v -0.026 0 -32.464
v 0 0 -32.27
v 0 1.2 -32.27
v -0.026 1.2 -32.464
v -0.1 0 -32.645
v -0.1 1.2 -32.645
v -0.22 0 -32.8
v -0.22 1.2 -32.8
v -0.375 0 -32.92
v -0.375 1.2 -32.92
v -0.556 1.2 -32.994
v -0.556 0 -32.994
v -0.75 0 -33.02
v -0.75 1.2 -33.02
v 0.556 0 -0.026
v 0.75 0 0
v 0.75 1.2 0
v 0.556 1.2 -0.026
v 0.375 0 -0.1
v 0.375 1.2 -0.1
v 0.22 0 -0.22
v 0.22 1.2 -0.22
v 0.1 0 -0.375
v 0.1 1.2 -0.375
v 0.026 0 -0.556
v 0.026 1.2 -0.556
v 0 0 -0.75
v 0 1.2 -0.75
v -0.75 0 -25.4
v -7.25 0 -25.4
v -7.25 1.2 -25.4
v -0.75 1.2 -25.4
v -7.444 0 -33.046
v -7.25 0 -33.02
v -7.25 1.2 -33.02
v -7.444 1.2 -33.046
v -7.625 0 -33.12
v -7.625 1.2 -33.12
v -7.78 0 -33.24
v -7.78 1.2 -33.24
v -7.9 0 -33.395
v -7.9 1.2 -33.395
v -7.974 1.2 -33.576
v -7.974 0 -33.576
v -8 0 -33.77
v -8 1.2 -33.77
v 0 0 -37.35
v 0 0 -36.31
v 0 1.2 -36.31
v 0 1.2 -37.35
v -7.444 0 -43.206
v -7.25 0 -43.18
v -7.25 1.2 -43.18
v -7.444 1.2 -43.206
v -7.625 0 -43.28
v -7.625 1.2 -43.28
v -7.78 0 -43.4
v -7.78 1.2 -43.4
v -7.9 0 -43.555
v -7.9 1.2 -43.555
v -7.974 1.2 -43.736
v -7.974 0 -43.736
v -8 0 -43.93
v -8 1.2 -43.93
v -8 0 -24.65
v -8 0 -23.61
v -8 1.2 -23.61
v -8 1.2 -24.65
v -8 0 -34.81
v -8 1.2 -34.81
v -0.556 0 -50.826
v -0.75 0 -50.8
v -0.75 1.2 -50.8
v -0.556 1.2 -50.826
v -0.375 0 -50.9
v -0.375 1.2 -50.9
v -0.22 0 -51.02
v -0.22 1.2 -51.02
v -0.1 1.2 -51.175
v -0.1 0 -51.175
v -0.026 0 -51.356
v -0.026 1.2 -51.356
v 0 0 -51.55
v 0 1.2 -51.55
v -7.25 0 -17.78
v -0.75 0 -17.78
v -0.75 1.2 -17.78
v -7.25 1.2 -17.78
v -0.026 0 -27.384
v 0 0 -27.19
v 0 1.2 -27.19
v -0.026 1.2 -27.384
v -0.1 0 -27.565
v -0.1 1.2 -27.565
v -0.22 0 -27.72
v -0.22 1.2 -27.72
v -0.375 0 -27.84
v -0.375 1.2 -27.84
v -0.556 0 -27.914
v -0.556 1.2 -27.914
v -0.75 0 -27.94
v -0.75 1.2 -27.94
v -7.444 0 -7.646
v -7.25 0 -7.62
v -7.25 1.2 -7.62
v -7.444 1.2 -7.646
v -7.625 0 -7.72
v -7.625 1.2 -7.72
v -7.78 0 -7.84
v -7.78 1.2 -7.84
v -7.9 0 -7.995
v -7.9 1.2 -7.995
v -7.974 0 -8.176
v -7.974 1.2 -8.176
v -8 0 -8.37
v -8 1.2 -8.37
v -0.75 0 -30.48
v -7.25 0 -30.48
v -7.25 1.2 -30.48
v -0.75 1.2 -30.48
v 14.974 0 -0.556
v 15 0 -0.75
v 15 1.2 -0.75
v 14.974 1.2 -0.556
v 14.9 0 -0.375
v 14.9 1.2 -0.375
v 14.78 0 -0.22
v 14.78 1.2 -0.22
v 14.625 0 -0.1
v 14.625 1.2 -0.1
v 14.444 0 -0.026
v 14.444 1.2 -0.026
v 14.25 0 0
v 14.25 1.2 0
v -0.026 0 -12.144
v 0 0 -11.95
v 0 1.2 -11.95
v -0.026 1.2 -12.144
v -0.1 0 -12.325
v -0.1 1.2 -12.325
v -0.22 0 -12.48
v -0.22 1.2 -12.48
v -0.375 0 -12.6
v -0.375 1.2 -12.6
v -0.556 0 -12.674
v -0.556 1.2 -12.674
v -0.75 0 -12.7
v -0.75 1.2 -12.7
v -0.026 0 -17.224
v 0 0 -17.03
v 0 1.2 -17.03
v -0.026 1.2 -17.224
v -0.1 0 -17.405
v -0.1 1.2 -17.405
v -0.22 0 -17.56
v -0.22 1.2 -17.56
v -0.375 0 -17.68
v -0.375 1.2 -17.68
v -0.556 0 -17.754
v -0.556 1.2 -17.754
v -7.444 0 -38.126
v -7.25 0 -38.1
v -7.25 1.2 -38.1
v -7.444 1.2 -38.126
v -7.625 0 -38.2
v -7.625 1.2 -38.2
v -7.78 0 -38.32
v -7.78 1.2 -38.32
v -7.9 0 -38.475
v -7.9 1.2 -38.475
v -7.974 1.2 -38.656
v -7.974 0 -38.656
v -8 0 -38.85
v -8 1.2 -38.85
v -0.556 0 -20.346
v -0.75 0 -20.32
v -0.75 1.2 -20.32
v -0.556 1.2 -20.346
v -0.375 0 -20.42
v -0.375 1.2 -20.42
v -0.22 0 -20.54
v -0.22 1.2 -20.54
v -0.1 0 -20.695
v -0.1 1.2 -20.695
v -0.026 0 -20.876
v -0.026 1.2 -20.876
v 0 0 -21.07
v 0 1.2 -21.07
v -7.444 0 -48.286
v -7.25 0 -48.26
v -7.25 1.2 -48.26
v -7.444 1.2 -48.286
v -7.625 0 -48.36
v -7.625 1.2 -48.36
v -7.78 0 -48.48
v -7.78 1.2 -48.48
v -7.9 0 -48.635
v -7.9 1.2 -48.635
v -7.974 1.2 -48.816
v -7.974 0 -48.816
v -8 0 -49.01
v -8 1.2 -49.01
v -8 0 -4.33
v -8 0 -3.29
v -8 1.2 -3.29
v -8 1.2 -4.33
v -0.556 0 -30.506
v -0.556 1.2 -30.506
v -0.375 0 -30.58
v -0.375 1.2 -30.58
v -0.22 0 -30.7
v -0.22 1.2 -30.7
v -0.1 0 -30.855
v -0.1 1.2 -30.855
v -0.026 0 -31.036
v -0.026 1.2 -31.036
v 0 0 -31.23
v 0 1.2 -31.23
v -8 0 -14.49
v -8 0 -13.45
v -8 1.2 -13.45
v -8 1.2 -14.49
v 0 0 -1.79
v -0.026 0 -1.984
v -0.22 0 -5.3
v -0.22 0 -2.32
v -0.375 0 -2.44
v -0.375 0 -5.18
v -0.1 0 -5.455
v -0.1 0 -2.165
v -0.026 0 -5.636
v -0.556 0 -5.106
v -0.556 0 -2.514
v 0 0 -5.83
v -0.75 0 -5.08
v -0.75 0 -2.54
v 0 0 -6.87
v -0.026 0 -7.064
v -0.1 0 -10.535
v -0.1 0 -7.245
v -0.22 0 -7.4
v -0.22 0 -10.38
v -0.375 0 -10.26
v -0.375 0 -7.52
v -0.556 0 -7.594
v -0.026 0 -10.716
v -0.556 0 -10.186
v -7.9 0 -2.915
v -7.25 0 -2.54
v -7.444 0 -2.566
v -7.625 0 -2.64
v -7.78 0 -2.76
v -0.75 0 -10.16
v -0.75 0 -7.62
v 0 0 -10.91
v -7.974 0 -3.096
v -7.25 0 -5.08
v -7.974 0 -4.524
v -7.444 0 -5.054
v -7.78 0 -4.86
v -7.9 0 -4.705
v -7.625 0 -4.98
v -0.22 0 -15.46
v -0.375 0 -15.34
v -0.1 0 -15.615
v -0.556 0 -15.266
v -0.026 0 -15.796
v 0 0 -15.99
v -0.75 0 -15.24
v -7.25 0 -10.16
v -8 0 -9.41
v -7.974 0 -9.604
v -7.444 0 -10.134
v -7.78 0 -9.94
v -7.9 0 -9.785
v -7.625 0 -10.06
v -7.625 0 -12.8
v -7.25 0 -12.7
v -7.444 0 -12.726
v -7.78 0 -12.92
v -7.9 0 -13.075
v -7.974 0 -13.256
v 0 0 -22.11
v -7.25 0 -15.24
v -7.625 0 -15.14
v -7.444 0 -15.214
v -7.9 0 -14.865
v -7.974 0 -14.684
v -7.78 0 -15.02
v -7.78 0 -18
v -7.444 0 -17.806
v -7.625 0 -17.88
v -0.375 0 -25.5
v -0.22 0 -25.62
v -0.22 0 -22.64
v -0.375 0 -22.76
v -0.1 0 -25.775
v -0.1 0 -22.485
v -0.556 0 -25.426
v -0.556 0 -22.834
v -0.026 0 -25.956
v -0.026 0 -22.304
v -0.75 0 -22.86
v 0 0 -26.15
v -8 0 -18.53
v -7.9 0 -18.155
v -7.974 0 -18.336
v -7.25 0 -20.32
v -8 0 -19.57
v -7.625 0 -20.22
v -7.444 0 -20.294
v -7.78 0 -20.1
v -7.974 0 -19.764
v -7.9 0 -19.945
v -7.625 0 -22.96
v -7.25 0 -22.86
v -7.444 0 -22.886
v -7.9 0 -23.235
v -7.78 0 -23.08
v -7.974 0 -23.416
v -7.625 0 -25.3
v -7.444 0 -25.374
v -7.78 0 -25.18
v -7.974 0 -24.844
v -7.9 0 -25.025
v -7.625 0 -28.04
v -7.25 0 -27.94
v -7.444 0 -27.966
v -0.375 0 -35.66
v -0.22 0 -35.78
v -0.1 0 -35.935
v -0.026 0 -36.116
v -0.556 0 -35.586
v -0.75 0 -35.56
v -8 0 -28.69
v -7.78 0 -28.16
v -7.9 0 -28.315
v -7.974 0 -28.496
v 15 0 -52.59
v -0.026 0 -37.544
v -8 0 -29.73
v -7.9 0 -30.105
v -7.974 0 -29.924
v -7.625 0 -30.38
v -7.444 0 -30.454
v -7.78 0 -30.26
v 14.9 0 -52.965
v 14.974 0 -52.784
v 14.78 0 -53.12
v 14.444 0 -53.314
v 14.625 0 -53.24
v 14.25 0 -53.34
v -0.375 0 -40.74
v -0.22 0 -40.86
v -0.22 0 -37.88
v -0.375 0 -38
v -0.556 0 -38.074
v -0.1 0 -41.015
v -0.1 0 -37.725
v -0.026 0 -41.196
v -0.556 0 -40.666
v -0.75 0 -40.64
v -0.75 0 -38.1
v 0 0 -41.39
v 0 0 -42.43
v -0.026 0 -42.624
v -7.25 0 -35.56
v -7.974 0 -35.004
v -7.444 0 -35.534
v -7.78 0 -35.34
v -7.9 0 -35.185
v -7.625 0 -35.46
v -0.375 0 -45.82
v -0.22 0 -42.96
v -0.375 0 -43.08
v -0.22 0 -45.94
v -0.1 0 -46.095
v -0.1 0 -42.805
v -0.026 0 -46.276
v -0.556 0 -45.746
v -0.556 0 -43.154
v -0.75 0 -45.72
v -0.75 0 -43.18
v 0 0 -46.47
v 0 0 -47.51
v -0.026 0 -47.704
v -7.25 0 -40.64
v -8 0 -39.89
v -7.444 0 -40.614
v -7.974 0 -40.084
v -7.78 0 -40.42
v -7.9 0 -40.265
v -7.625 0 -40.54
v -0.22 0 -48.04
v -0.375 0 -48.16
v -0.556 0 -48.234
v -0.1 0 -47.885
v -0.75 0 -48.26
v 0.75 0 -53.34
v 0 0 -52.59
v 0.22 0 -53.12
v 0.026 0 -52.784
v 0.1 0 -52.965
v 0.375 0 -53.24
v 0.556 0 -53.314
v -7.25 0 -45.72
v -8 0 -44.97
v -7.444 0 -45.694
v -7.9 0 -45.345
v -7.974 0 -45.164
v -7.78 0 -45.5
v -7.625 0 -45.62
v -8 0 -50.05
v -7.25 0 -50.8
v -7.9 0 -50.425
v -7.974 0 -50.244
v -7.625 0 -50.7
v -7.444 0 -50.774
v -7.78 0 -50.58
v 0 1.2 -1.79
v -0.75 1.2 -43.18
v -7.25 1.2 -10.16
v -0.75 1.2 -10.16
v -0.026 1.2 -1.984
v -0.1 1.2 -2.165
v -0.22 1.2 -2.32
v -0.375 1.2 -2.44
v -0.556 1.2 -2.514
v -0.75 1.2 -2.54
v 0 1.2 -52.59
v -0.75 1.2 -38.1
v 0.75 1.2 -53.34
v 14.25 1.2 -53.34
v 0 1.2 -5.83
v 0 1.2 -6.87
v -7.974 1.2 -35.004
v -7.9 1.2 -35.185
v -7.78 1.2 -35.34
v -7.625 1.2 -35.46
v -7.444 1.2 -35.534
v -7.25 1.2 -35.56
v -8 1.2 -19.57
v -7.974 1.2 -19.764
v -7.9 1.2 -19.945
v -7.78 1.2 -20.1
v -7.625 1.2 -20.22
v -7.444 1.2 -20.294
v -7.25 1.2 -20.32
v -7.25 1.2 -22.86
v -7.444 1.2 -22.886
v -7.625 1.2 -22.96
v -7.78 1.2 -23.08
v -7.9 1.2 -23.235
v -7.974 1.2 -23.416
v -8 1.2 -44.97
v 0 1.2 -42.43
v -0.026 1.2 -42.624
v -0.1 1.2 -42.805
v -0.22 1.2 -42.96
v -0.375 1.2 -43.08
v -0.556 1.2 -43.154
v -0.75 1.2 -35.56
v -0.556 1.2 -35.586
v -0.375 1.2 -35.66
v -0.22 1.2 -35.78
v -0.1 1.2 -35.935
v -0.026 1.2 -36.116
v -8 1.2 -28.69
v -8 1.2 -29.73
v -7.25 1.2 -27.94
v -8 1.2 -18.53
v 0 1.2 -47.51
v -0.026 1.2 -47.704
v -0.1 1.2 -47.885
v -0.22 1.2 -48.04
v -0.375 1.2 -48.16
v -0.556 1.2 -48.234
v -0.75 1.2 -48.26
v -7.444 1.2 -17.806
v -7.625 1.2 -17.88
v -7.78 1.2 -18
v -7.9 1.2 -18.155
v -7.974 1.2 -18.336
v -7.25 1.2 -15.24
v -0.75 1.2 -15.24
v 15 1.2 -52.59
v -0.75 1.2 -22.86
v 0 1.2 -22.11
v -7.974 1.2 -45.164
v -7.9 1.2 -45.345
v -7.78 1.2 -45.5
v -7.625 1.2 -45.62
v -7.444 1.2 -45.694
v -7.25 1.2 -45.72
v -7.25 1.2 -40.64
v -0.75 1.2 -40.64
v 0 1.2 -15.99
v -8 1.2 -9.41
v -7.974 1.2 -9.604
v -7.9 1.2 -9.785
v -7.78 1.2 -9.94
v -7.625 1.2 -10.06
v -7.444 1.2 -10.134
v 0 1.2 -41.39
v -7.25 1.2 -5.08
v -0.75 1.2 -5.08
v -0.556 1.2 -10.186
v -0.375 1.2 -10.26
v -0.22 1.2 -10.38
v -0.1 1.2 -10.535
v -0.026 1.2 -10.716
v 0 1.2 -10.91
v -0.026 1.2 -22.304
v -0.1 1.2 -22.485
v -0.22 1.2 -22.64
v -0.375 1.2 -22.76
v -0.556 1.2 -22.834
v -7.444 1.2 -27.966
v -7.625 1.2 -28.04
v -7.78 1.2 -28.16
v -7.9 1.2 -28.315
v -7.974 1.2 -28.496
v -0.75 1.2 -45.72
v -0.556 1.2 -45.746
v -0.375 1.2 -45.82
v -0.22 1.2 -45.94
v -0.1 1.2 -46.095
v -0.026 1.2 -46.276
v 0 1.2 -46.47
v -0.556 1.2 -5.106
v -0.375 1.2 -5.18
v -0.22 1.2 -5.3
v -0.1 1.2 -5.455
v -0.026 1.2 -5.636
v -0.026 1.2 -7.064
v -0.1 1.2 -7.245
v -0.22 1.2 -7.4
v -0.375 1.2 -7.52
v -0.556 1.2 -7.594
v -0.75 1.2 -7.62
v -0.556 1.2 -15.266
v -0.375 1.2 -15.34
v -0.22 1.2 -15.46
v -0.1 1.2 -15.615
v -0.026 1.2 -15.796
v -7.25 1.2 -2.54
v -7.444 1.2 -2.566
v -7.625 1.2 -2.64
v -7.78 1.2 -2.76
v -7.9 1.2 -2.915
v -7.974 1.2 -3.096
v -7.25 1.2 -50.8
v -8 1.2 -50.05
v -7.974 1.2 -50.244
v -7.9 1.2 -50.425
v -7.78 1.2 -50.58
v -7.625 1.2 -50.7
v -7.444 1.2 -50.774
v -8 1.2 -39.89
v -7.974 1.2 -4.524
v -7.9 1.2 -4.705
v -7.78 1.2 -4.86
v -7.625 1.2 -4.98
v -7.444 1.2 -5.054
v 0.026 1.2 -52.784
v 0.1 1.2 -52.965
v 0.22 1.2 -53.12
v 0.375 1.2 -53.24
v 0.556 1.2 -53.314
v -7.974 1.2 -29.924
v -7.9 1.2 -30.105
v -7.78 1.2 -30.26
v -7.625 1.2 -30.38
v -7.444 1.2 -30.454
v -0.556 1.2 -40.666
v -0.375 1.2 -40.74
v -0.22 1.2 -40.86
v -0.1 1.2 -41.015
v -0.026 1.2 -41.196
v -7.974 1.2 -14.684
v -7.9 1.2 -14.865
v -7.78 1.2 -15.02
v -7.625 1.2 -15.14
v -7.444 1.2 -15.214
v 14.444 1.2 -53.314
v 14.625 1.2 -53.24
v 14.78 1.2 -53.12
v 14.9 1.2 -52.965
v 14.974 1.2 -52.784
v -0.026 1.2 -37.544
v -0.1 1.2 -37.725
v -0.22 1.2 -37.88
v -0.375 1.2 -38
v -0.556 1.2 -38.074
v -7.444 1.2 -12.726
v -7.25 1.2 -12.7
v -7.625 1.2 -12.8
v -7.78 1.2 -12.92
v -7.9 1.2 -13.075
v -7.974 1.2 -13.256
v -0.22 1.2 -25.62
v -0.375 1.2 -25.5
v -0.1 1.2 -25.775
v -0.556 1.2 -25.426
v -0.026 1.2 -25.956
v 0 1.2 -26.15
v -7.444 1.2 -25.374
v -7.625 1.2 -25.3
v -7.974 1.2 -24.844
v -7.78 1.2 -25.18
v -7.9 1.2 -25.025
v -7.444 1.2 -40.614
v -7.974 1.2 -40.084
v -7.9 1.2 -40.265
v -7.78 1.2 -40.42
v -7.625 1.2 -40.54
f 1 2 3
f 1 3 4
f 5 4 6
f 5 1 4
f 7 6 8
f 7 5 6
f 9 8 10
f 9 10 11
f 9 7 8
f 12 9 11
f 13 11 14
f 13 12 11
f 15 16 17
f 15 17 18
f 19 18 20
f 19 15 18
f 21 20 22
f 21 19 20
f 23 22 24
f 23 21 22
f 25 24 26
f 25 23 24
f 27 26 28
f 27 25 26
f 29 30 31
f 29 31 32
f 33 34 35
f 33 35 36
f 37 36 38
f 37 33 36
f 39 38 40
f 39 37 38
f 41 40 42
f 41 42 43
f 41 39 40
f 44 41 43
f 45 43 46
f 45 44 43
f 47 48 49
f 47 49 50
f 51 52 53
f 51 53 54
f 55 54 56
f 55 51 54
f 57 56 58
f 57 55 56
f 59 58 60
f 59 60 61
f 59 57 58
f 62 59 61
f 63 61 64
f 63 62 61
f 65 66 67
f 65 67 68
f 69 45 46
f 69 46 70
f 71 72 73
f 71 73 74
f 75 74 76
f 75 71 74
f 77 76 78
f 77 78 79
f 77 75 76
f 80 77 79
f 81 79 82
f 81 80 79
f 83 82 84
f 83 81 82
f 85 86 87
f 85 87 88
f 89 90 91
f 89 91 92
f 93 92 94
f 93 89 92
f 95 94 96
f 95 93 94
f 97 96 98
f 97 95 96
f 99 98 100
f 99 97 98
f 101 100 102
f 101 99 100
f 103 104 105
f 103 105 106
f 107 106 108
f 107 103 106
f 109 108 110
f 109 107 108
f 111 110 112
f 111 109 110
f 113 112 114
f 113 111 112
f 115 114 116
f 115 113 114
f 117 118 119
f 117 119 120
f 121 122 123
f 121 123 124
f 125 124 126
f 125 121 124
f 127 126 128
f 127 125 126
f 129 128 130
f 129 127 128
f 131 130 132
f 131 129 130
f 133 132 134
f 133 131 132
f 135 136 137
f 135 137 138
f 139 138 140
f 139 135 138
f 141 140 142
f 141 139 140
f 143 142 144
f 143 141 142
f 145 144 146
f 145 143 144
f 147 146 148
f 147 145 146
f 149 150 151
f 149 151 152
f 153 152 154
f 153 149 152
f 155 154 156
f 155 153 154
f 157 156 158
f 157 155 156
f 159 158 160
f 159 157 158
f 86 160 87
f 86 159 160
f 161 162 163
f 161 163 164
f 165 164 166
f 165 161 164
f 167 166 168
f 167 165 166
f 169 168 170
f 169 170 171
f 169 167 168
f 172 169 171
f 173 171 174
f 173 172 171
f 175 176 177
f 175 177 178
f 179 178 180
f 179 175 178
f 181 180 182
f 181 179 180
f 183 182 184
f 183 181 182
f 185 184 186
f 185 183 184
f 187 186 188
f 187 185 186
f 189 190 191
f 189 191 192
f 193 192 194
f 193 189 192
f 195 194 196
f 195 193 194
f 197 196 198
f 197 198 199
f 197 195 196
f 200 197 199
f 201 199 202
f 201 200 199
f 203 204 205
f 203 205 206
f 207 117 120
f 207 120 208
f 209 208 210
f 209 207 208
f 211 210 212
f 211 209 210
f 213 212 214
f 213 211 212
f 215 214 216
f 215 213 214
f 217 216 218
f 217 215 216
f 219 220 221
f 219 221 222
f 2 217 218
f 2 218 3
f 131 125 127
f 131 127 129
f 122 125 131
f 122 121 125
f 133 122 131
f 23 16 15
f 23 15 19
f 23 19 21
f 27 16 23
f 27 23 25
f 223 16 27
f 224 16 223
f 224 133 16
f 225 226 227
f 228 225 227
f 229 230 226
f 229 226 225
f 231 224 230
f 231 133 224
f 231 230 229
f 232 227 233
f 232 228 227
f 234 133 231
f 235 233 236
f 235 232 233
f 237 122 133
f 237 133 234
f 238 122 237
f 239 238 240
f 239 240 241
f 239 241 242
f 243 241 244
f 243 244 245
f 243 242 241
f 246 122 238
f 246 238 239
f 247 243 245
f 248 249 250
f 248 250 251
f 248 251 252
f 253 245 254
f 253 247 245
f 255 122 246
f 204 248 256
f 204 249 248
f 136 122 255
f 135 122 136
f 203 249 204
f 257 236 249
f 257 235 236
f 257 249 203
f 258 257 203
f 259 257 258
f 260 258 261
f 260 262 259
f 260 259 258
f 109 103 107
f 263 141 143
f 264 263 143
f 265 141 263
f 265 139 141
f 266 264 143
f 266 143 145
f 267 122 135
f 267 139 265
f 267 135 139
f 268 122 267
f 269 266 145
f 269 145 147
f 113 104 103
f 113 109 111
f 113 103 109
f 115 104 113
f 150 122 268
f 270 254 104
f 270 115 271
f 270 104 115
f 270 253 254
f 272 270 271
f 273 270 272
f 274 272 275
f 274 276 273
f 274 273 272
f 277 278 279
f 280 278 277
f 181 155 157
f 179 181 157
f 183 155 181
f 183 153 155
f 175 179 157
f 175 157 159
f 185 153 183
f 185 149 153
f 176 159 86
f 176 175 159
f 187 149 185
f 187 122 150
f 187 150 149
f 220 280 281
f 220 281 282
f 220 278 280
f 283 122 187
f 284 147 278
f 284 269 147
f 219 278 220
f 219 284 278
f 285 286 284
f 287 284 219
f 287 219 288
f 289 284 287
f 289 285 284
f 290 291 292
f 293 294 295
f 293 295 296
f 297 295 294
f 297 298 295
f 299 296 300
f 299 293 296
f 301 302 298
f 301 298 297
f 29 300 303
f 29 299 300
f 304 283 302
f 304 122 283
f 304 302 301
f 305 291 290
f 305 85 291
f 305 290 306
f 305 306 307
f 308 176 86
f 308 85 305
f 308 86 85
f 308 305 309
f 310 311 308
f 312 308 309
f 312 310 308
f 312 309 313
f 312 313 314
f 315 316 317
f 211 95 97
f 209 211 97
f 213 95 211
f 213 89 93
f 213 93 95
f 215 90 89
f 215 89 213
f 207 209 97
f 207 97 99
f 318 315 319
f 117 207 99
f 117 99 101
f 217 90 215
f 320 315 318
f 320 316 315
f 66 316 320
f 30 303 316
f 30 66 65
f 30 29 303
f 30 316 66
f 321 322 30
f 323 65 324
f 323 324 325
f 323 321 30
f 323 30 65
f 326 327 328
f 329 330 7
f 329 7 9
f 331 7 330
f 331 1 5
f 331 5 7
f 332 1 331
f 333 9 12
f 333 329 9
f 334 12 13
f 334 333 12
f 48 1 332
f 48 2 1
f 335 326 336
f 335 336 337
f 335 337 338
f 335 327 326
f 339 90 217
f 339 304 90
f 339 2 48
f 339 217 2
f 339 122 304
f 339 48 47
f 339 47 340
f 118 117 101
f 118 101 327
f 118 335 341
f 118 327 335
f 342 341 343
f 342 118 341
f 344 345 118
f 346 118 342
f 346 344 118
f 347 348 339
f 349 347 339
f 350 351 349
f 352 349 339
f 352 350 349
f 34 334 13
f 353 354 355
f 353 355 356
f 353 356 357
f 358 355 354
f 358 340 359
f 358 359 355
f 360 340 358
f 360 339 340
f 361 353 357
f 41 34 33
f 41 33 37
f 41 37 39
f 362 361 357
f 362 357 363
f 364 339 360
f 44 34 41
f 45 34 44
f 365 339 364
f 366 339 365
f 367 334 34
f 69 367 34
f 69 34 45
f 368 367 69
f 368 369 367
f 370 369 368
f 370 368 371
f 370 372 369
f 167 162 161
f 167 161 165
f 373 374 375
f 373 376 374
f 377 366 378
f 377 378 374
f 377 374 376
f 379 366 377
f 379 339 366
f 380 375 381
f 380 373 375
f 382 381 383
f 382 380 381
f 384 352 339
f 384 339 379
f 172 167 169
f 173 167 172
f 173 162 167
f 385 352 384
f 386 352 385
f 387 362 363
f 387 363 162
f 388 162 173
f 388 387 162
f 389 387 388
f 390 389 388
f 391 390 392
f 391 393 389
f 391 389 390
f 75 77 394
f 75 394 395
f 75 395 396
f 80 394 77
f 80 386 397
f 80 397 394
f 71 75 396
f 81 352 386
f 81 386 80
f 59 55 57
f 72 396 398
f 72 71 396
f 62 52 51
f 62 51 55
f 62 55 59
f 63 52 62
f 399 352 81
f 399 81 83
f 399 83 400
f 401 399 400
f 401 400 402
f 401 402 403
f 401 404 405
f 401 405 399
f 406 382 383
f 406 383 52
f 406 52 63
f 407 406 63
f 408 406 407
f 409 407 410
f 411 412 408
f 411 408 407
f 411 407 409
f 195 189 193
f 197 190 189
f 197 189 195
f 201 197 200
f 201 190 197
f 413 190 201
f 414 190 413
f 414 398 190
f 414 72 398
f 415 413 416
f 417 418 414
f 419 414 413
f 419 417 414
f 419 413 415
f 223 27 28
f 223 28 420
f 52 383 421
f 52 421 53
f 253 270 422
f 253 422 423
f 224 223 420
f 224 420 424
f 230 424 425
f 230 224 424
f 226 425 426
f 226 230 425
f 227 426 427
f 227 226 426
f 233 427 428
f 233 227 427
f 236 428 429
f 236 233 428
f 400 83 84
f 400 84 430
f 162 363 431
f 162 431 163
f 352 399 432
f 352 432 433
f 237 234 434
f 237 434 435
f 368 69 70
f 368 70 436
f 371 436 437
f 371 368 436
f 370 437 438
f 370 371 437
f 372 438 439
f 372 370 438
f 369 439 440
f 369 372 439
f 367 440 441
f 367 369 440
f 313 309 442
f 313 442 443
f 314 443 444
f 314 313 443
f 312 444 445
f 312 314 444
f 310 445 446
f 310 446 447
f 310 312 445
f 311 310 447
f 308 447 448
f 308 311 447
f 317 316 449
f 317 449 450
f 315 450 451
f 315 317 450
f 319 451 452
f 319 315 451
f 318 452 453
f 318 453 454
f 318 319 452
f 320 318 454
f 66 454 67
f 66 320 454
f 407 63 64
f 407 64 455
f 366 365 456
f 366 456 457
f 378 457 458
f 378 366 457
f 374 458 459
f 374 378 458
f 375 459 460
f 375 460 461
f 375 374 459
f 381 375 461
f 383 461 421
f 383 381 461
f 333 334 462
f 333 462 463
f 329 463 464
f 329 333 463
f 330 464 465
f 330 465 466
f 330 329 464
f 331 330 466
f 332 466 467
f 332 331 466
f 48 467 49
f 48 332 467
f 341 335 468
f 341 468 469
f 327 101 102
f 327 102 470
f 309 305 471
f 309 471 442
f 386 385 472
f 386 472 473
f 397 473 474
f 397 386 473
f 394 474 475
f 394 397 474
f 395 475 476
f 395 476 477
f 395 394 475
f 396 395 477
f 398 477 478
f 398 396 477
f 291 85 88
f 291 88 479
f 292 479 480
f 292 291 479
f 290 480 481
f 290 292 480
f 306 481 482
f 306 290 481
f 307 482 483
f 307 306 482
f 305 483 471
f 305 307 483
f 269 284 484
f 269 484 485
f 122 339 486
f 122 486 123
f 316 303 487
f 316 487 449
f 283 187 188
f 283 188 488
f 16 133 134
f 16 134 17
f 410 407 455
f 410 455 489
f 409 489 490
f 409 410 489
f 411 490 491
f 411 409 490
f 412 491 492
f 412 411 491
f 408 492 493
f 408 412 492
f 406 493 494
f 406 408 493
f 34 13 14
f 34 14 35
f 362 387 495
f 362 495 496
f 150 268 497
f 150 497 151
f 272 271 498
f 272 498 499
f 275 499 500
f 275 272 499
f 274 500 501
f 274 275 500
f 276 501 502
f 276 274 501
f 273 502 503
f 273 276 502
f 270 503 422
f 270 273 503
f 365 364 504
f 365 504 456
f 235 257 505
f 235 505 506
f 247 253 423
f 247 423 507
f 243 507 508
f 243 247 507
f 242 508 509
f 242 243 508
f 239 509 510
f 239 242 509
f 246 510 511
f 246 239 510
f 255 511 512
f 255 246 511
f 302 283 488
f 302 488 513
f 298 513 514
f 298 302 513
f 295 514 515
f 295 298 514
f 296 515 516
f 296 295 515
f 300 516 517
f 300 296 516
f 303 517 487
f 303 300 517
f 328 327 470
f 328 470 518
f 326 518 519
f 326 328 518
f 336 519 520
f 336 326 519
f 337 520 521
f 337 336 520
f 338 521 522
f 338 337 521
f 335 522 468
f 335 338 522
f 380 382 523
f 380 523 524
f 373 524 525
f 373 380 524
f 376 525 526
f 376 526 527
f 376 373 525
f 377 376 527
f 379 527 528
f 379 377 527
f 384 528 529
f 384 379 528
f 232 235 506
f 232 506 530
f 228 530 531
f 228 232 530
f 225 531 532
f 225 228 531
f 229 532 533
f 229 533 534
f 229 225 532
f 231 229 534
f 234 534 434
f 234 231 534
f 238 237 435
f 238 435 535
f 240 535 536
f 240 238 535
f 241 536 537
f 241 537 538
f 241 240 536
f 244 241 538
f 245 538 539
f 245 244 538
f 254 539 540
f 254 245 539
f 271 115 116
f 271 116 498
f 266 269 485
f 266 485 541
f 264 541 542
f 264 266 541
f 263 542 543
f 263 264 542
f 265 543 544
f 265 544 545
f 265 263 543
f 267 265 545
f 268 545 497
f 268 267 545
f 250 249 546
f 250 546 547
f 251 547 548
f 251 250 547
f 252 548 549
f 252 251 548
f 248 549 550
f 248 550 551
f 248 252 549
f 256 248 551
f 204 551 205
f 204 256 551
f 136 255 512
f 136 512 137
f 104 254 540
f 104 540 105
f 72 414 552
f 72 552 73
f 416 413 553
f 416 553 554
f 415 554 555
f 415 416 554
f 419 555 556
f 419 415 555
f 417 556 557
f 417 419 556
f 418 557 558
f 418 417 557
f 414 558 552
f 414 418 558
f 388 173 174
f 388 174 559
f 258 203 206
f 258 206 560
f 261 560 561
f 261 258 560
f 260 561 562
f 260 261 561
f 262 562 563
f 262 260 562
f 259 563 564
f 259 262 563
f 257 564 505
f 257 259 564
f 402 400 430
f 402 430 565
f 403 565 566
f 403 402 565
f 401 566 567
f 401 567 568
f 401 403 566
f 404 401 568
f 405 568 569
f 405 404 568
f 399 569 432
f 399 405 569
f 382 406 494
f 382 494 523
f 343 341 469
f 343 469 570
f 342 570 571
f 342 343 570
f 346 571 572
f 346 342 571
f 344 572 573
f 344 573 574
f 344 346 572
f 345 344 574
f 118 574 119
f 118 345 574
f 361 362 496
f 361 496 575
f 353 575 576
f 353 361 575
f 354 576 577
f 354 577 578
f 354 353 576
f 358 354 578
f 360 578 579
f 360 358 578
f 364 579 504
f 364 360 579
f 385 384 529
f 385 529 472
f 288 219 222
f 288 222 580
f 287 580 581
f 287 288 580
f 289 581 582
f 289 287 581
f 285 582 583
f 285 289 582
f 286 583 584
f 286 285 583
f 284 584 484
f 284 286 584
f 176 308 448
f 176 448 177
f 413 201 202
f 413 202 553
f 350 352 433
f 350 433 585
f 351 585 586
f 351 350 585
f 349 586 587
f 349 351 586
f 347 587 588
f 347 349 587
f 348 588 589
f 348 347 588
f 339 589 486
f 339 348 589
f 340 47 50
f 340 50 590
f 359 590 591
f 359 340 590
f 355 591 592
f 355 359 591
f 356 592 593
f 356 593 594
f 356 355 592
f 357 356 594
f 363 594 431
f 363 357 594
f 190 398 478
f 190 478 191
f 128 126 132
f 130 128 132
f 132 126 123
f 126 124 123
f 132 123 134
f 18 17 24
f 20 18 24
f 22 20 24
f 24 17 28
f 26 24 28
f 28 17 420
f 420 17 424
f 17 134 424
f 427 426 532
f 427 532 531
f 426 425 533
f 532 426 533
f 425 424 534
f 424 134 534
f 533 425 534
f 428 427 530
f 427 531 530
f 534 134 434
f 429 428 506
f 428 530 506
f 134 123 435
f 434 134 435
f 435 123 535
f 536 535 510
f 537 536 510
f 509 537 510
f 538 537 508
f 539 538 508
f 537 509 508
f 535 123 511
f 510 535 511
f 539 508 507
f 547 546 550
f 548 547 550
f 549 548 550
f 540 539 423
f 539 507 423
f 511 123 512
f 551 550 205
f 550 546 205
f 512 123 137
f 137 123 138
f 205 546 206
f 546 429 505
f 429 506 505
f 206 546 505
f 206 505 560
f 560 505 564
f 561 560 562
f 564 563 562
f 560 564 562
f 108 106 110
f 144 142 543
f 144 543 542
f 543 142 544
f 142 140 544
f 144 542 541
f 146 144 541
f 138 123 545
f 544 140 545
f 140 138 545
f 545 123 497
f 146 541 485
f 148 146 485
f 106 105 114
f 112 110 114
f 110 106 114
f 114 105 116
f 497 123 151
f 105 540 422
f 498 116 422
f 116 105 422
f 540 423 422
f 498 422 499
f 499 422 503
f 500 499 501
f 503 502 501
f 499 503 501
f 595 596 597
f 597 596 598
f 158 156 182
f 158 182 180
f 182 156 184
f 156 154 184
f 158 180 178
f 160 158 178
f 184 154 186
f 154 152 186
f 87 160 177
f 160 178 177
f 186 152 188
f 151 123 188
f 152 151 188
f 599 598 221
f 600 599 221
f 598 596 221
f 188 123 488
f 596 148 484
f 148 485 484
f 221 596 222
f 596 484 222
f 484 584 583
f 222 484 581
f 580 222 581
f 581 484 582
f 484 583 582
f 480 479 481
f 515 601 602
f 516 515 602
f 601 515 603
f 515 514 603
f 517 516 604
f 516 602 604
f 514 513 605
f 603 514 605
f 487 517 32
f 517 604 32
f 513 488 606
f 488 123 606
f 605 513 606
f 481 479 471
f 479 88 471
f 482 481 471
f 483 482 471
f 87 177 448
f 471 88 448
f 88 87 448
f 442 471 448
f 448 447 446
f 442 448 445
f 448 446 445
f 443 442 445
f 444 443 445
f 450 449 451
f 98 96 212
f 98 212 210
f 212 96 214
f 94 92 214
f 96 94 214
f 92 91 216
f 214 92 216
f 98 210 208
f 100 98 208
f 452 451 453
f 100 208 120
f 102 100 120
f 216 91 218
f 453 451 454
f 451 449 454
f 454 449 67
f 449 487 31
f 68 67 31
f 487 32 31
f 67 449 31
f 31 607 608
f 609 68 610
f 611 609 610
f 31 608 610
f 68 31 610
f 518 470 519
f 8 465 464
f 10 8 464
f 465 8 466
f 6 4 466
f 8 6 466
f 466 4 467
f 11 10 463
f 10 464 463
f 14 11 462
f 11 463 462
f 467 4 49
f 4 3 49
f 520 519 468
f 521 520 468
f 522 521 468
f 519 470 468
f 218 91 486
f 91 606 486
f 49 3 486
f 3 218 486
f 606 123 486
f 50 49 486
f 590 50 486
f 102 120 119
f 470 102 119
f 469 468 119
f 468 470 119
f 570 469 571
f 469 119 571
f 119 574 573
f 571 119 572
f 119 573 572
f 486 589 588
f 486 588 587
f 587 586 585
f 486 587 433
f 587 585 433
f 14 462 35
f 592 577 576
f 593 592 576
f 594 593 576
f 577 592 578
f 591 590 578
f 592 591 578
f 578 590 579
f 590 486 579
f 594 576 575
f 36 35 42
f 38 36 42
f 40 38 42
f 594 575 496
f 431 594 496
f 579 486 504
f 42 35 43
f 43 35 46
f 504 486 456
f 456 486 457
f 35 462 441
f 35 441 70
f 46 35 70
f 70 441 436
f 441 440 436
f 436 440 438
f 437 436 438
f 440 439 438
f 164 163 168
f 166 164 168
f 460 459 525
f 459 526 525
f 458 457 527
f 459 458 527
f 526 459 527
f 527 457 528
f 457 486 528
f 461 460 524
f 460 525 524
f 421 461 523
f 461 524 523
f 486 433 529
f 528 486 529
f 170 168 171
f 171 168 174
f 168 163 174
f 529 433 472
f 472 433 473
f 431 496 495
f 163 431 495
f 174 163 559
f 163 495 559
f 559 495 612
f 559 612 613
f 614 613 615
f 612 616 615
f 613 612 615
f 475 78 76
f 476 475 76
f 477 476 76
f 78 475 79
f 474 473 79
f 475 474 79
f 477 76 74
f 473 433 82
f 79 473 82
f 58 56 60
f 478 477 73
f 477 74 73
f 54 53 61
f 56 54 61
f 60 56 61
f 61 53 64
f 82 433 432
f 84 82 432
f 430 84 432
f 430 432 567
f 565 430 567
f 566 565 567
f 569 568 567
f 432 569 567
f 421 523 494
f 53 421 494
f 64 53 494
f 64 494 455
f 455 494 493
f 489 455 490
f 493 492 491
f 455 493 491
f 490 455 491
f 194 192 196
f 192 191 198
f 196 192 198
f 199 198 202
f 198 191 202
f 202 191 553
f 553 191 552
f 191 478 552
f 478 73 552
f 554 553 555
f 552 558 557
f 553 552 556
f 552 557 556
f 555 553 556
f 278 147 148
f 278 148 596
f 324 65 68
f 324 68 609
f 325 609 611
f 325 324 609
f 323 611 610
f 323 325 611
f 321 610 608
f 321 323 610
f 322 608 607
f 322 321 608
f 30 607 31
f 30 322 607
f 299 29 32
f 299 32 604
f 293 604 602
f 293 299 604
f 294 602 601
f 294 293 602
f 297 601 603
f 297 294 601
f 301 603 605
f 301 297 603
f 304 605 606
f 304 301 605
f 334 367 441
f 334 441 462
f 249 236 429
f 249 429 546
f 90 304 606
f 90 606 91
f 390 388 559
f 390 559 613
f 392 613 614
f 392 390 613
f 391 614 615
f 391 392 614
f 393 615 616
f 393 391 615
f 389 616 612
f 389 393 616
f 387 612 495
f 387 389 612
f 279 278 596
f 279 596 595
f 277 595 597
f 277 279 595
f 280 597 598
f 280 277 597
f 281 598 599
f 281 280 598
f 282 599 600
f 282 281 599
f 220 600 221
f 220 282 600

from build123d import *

# Parameters (mm, degrees)
BOSS_EXTRUDE1_DEPTH = 1.2


with BuildPart() as part:
    # Sketch1 → Boss-Extrude1 (new body)
    with BuildSketch(Plane(origin=(0, 0, 0), x_dir=(1, 0, 0), z_dir=(0, 1, 0))):
        with BuildLine():
            Line((-0.75, 2.54), (-7.25, 2.54))
            ThreePointArc((-7.25, 2.54), (-7.780330086, 2.759669914), (-8, 3.29))
            Line((-8, 3.29), (-8, 4.33))
            ThreePointArc((-8, 4.33), (-7.780330086, 4.860330086), (-7.25, 5.08))
            Line((-7.25, 5.08), (-0.75, 5.08))
            ThreePointArc((-0.75, 5.08), (-0.219669914, 5.299669914), (0, 5.83))
            Line((0, 5.83), (0, 6.87))
            ThreePointArc((0, 6.87), (-0.219669914, 7.400330086), (-0.75, 7.62))
            Line((-0.75, 7.62), (-7.25, 7.62))
            ThreePointArc((-7.25, 7.62), (-7.780330086, 7.839669914), (-8, 8.37))
            Line((-8, 8.37), (-8, 9.41))
            ThreePointArc((-8, 9.41), (-7.780330086, 9.940330086), (-7.25, 10.16))
            Line((-7.25, 10.16), (-0.75, 10.16))
            ThreePointArc((-0.75, 10.16), (-0.219669914, 10.379669914), (0, 10.91))
            Line((0, 10.91), (0, 11.95))
            ThreePointArc((0, 11.95), (-0.219669914, 12.480330086), (-0.75, 12.7))
            Line((-0.75, 12.7), (-7.25, 12.7))
            ThreePointArc((-7.25, 12.7), (-7.780330086, 12.919669914), (-8, 13.45))
            Line((-8, 13.45), (-8, 14.49))
            ThreePointArc((-8, 14.49), (-7.780330086, 15.020330086), (-7.25, 15.24))
            Line((-7.25, 15.24), (-0.75, 15.24))
            ThreePointArc((-0.75, 15.24), (-0.219669914, 15.459669914), (0, 15.99))
            Line((0, 15.99), (0, 17.03))
            ThreePointArc((0, 17.03), (-0.219669914, 17.560330086), (-0.75, 17.78))
            Line((-0.75, 17.78), (-7.25, 17.78))
            ThreePointArc((-7.25, 17.78), (-7.780330086, 17.999669914), (-8, 18.53))
            Line((-8, 18.53), (-8, 19.57))
            ThreePointArc((-8, 19.57), (-7.780330086, 20.100330086), (-7.25, 20.32))
            Line((-7.25, 20.32), (-0.75, 20.32))
            ThreePointArc((-0.75, 20.32), (-0.219669914, 20.539669914), (0, 21.07))
            Line((0, 21.07), (0, 22.11))
            ThreePointArc((0, 22.11), (-0.219669914, 22.640330086), (-0.75, 22.86))
            Line((-0.75, 22.86), (-7.25, 22.86))
            ThreePointArc((-7.25, 22.86), (-7.780330086, 23.079669914), (-8, 23.61))
            Line((-8, 23.61), (-8, 24.65))
            ThreePointArc((-8, 24.65), (-7.780330086, 25.180330086), (-7.25, 25.4))
            Line((-7.25, 25.4), (-0.75, 25.4))
            ThreePointArc((-0.75, 25.4), (-0.219669914, 25.619669914), (0, 26.15))
            Line((0, 26.15), (0, 27.19))
            ThreePointArc((0, 27.19), (-0.219669914, 27.720330086), (-0.75, 27.94))
            Line((-0.75, 27.94), (-7.25, 27.94))
            ThreePointArc((-7.25, 27.94), (-7.780330086, 28.159669914), (-8, 28.69))
            Line((-8, 28.69), (-8, 29.73))
            ThreePointArc((-8, 29.73), (-7.780330086, 30.260330086), (-7.25, 30.48))
            Line((-7.25, 30.48), (-0.75, 30.48))
            ThreePointArc((-0.75, 30.48), (-0.219669914, 30.699669914), (0, 31.23))
            Line((0, 31.23), (0, 32.27))
            ThreePointArc((0, 32.27), (-0.219669914, 32.800330086), (-0.75, 33.02))
            Line((-0.75, 33.02), (-7.25, 33.02))
            ThreePointArc((-7.25, 33.02), (-7.780330086, 33.239669914), (-8, 33.77))
            Line((-8, 33.77), (-8, 34.81))
            ThreePointArc((-8, 34.81), (-7.780330086, 35.340330086), (-7.25, 35.56))
            Line((-7.25, 35.56), (-0.75, 35.56))
            ThreePointArc((-0.75, 35.56), (-0.219669914, 35.779669914), (0, 36.31))
            Line((0, 36.31), (0, 37.35))
            ThreePointArc((0, 37.35), (-0.219669914, 37.880330086), (-0.75, 38.1))
            Line((-0.75, 38.1), (-7.25, 38.1))
            ThreePointArc((-7.25, 38.1), (-7.780330086, 38.319669914), (-8, 38.85))
            Line((-8, 38.85), (-8, 39.89))
            ThreePointArc((-8, 39.89), (-7.780330086, 40.420330086), (-7.25, 40.64))
            Line((-7.25, 40.64), (-0.75, 40.64))
            ThreePointArc((-0.75, 40.64), (-0.219669914, 40.859669914), (0, 41.39))
            Line((0, 41.39), (0, 42.43))
            ThreePointArc((0, 42.43), (-0.219669914, 42.960330086), (-0.75, 43.18))
            Line((-0.75, 43.18), (-7.25, 43.18))
            ThreePointArc((-7.25, 43.18), (-7.780330086, 43.399669914), (-8, 43.93))
            Line((-8, 43.93), (-8, 44.97))
            ThreePointArc((-8, 44.97), (-7.780330086, 45.500330086), (-7.25, 45.72))
            Line((-7.25, 45.72), (-0.75, 45.72))
            ThreePointArc((-0.75, 45.72), (-0.219669914, 45.939669914), (0, 46.47))
            Line((0, 46.47), (0, 47.51))
            ThreePointArc((0, 47.51), (-0.219669914, 48.040330086), (-0.75, 48.26))
            Line((-0.75, 48.26), (-7.25, 48.26))
            ThreePointArc((-7.25, 48.26), (-7.780330086, 48.479669914), (-8, 49.01))
            Line((-8, 49.01), (-8, 50.05))
            ThreePointArc((-8, 50.05), (-7.780330086, 50.580330086), (-7.25, 50.8))
            Line((-7.25, 50.8), (-0.75, 50.8))
            ThreePointArc((-0.75, 50.8), (-0.219669914, 51.019669914), (0, 51.55))
            Line((0, 51.55), (0, 52.59))
            ThreePointArc((0, 52.59), (0.219669914, 53.120330086), (0.75, 53.34))
            Line((0.75, 53.34), (14.25, 53.34))
            ThreePointArc((14.25, 53.34), (14.780330086, 53.120330086), (15, 52.59))
            Line((15, 52.59), (15, 0.75))
            ThreePointArc((15, 0.75), (14.780330086, 0.219669914), (14.25, 0))
            Line((14.25, 0), (0.75, 0))
            ThreePointArc((0.75, 0), (0.219669914, 0.219669914), (0, 0.75))
            Line((0, 0.75), (0, 1.79))
            ThreePointArc((0, 1.79), (-0.219669914, 2.320330086), (-0.75, 2.54))
        make_face()
    extrude(amount=BOSS_EXTRUDE1_DEPTH)


solid = part.part
